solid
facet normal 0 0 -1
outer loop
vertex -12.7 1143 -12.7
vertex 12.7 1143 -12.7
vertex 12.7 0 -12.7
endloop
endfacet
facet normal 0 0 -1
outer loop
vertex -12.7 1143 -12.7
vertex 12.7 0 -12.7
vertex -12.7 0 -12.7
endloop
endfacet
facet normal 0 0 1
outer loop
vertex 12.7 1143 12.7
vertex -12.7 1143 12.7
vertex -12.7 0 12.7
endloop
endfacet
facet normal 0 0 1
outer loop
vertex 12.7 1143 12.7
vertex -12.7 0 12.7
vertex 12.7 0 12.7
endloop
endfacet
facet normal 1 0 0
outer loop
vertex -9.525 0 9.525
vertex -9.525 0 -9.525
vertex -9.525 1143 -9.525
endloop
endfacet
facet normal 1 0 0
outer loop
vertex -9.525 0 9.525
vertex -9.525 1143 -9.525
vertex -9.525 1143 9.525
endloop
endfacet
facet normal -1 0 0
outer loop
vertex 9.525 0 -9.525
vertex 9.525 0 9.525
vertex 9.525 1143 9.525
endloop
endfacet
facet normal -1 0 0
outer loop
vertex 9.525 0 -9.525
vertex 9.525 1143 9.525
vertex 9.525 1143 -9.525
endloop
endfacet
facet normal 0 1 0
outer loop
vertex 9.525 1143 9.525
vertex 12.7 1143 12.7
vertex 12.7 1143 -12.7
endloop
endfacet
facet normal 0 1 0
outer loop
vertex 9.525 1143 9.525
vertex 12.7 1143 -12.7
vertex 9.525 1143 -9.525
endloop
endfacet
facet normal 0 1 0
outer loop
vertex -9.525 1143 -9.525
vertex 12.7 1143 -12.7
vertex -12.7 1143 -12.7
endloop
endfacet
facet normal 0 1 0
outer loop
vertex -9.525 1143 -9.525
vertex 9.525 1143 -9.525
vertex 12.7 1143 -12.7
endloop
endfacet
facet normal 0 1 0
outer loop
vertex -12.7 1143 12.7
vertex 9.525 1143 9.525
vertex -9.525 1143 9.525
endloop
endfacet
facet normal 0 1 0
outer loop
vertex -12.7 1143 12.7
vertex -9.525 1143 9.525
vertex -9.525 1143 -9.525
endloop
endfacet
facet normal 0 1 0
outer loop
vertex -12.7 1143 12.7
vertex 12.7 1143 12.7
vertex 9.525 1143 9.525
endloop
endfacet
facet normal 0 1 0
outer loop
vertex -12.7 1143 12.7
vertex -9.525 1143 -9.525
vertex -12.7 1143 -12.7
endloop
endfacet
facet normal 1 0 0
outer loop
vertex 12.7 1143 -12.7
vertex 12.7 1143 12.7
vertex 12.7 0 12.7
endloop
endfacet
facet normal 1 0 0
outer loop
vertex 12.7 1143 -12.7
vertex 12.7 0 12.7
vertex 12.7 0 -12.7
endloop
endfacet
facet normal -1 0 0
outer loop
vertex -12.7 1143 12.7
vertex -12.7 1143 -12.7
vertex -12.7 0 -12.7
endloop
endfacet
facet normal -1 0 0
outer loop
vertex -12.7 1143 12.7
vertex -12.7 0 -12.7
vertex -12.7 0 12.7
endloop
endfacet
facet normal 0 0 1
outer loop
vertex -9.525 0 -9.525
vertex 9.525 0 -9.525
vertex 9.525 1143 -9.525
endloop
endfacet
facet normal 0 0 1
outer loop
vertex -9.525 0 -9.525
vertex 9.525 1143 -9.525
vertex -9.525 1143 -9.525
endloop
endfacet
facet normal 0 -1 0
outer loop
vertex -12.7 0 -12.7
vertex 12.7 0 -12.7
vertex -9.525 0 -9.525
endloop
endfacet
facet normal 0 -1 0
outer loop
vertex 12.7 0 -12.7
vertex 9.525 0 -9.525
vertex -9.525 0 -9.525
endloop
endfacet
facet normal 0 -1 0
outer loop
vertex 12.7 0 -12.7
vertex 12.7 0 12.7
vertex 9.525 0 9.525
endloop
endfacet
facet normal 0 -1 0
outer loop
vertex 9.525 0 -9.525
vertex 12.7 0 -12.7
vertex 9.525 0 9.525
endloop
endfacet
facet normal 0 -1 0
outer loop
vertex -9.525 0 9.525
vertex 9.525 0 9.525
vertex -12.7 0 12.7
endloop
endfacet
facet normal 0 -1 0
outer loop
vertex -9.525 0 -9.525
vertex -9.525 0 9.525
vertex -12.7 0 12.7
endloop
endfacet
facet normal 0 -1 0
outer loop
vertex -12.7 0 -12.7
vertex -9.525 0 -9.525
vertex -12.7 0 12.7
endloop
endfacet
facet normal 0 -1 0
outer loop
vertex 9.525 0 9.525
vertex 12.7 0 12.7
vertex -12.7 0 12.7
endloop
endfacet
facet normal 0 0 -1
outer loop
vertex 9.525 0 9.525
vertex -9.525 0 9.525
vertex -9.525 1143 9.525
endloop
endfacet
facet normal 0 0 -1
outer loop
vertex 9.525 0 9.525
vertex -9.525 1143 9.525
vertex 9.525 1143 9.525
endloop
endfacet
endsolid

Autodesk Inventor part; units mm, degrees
ref_plane "YZ Plane" through (0, 0, 0) normal (1, 0, 0) x (0, 1, 0)
ref_plane "XY Plane" through (0, 0, 0) normal (0, 0, 1) x (1, 0, 0)
sketch "Sketch1" plane through (0, 0, 0) normal (0, 1, 0) x (-1, 0, 0)
  line L0 (12.7, 12.7) -> (-12.7, 12.7)
  line L1 (-12.7, 12.7) -> (-12.7, -12.7)
  line L2 (-12.7, -12.7) -> (12.7, -12.7)
  line L3 (12.7, -12.7) -> (12.7, 12.7)
  line L4 (12.7, 12.7) -> (-12.7, -12.7) construction
  line L5 (-12.7, 12.7) -> (12.7, -12.7) construction
  line L6 (9.525, 9.525) -> (-9.525, 9.525)
  line L7 (-9.525, 9.525) -> (-9.525, -9.525)
  line L8 (-9.525, -9.525) -> (9.525, -9.525)
  line L9 (9.525, -9.525) -> (9.525, 9.525)
  line L10 (9.525, 9.525) -> (-9.525, -9.525) construction
  line L11 (-9.525, 9.525) -> (9.525, -9.525) construction
  point P0 (0, 0)
  dimension "d0" = 25.4
  dimension "d1" = 3.175
extrude "Extrusion1" add sketch "Sketch1" along normal blind 1143
sketch "Sketch2" plane through (-12.7, 0, -12.7) normal (-1, 0, 0) x (0, 0, 1)
  point P0 (12.7, 0)
equation "\"d0\" = tubeSize"
equation "\"d1\" = tubeThickness"
equation "\"d2\" = tubeLength"
equation "\"tubeSize\" = 25.4"
equation "\"tubeThickness\" = 3.175"
equation "\"tubeLength\" = 1143"
properties part number "1_000_inchSquareTube" material "Aluminum 6061"
